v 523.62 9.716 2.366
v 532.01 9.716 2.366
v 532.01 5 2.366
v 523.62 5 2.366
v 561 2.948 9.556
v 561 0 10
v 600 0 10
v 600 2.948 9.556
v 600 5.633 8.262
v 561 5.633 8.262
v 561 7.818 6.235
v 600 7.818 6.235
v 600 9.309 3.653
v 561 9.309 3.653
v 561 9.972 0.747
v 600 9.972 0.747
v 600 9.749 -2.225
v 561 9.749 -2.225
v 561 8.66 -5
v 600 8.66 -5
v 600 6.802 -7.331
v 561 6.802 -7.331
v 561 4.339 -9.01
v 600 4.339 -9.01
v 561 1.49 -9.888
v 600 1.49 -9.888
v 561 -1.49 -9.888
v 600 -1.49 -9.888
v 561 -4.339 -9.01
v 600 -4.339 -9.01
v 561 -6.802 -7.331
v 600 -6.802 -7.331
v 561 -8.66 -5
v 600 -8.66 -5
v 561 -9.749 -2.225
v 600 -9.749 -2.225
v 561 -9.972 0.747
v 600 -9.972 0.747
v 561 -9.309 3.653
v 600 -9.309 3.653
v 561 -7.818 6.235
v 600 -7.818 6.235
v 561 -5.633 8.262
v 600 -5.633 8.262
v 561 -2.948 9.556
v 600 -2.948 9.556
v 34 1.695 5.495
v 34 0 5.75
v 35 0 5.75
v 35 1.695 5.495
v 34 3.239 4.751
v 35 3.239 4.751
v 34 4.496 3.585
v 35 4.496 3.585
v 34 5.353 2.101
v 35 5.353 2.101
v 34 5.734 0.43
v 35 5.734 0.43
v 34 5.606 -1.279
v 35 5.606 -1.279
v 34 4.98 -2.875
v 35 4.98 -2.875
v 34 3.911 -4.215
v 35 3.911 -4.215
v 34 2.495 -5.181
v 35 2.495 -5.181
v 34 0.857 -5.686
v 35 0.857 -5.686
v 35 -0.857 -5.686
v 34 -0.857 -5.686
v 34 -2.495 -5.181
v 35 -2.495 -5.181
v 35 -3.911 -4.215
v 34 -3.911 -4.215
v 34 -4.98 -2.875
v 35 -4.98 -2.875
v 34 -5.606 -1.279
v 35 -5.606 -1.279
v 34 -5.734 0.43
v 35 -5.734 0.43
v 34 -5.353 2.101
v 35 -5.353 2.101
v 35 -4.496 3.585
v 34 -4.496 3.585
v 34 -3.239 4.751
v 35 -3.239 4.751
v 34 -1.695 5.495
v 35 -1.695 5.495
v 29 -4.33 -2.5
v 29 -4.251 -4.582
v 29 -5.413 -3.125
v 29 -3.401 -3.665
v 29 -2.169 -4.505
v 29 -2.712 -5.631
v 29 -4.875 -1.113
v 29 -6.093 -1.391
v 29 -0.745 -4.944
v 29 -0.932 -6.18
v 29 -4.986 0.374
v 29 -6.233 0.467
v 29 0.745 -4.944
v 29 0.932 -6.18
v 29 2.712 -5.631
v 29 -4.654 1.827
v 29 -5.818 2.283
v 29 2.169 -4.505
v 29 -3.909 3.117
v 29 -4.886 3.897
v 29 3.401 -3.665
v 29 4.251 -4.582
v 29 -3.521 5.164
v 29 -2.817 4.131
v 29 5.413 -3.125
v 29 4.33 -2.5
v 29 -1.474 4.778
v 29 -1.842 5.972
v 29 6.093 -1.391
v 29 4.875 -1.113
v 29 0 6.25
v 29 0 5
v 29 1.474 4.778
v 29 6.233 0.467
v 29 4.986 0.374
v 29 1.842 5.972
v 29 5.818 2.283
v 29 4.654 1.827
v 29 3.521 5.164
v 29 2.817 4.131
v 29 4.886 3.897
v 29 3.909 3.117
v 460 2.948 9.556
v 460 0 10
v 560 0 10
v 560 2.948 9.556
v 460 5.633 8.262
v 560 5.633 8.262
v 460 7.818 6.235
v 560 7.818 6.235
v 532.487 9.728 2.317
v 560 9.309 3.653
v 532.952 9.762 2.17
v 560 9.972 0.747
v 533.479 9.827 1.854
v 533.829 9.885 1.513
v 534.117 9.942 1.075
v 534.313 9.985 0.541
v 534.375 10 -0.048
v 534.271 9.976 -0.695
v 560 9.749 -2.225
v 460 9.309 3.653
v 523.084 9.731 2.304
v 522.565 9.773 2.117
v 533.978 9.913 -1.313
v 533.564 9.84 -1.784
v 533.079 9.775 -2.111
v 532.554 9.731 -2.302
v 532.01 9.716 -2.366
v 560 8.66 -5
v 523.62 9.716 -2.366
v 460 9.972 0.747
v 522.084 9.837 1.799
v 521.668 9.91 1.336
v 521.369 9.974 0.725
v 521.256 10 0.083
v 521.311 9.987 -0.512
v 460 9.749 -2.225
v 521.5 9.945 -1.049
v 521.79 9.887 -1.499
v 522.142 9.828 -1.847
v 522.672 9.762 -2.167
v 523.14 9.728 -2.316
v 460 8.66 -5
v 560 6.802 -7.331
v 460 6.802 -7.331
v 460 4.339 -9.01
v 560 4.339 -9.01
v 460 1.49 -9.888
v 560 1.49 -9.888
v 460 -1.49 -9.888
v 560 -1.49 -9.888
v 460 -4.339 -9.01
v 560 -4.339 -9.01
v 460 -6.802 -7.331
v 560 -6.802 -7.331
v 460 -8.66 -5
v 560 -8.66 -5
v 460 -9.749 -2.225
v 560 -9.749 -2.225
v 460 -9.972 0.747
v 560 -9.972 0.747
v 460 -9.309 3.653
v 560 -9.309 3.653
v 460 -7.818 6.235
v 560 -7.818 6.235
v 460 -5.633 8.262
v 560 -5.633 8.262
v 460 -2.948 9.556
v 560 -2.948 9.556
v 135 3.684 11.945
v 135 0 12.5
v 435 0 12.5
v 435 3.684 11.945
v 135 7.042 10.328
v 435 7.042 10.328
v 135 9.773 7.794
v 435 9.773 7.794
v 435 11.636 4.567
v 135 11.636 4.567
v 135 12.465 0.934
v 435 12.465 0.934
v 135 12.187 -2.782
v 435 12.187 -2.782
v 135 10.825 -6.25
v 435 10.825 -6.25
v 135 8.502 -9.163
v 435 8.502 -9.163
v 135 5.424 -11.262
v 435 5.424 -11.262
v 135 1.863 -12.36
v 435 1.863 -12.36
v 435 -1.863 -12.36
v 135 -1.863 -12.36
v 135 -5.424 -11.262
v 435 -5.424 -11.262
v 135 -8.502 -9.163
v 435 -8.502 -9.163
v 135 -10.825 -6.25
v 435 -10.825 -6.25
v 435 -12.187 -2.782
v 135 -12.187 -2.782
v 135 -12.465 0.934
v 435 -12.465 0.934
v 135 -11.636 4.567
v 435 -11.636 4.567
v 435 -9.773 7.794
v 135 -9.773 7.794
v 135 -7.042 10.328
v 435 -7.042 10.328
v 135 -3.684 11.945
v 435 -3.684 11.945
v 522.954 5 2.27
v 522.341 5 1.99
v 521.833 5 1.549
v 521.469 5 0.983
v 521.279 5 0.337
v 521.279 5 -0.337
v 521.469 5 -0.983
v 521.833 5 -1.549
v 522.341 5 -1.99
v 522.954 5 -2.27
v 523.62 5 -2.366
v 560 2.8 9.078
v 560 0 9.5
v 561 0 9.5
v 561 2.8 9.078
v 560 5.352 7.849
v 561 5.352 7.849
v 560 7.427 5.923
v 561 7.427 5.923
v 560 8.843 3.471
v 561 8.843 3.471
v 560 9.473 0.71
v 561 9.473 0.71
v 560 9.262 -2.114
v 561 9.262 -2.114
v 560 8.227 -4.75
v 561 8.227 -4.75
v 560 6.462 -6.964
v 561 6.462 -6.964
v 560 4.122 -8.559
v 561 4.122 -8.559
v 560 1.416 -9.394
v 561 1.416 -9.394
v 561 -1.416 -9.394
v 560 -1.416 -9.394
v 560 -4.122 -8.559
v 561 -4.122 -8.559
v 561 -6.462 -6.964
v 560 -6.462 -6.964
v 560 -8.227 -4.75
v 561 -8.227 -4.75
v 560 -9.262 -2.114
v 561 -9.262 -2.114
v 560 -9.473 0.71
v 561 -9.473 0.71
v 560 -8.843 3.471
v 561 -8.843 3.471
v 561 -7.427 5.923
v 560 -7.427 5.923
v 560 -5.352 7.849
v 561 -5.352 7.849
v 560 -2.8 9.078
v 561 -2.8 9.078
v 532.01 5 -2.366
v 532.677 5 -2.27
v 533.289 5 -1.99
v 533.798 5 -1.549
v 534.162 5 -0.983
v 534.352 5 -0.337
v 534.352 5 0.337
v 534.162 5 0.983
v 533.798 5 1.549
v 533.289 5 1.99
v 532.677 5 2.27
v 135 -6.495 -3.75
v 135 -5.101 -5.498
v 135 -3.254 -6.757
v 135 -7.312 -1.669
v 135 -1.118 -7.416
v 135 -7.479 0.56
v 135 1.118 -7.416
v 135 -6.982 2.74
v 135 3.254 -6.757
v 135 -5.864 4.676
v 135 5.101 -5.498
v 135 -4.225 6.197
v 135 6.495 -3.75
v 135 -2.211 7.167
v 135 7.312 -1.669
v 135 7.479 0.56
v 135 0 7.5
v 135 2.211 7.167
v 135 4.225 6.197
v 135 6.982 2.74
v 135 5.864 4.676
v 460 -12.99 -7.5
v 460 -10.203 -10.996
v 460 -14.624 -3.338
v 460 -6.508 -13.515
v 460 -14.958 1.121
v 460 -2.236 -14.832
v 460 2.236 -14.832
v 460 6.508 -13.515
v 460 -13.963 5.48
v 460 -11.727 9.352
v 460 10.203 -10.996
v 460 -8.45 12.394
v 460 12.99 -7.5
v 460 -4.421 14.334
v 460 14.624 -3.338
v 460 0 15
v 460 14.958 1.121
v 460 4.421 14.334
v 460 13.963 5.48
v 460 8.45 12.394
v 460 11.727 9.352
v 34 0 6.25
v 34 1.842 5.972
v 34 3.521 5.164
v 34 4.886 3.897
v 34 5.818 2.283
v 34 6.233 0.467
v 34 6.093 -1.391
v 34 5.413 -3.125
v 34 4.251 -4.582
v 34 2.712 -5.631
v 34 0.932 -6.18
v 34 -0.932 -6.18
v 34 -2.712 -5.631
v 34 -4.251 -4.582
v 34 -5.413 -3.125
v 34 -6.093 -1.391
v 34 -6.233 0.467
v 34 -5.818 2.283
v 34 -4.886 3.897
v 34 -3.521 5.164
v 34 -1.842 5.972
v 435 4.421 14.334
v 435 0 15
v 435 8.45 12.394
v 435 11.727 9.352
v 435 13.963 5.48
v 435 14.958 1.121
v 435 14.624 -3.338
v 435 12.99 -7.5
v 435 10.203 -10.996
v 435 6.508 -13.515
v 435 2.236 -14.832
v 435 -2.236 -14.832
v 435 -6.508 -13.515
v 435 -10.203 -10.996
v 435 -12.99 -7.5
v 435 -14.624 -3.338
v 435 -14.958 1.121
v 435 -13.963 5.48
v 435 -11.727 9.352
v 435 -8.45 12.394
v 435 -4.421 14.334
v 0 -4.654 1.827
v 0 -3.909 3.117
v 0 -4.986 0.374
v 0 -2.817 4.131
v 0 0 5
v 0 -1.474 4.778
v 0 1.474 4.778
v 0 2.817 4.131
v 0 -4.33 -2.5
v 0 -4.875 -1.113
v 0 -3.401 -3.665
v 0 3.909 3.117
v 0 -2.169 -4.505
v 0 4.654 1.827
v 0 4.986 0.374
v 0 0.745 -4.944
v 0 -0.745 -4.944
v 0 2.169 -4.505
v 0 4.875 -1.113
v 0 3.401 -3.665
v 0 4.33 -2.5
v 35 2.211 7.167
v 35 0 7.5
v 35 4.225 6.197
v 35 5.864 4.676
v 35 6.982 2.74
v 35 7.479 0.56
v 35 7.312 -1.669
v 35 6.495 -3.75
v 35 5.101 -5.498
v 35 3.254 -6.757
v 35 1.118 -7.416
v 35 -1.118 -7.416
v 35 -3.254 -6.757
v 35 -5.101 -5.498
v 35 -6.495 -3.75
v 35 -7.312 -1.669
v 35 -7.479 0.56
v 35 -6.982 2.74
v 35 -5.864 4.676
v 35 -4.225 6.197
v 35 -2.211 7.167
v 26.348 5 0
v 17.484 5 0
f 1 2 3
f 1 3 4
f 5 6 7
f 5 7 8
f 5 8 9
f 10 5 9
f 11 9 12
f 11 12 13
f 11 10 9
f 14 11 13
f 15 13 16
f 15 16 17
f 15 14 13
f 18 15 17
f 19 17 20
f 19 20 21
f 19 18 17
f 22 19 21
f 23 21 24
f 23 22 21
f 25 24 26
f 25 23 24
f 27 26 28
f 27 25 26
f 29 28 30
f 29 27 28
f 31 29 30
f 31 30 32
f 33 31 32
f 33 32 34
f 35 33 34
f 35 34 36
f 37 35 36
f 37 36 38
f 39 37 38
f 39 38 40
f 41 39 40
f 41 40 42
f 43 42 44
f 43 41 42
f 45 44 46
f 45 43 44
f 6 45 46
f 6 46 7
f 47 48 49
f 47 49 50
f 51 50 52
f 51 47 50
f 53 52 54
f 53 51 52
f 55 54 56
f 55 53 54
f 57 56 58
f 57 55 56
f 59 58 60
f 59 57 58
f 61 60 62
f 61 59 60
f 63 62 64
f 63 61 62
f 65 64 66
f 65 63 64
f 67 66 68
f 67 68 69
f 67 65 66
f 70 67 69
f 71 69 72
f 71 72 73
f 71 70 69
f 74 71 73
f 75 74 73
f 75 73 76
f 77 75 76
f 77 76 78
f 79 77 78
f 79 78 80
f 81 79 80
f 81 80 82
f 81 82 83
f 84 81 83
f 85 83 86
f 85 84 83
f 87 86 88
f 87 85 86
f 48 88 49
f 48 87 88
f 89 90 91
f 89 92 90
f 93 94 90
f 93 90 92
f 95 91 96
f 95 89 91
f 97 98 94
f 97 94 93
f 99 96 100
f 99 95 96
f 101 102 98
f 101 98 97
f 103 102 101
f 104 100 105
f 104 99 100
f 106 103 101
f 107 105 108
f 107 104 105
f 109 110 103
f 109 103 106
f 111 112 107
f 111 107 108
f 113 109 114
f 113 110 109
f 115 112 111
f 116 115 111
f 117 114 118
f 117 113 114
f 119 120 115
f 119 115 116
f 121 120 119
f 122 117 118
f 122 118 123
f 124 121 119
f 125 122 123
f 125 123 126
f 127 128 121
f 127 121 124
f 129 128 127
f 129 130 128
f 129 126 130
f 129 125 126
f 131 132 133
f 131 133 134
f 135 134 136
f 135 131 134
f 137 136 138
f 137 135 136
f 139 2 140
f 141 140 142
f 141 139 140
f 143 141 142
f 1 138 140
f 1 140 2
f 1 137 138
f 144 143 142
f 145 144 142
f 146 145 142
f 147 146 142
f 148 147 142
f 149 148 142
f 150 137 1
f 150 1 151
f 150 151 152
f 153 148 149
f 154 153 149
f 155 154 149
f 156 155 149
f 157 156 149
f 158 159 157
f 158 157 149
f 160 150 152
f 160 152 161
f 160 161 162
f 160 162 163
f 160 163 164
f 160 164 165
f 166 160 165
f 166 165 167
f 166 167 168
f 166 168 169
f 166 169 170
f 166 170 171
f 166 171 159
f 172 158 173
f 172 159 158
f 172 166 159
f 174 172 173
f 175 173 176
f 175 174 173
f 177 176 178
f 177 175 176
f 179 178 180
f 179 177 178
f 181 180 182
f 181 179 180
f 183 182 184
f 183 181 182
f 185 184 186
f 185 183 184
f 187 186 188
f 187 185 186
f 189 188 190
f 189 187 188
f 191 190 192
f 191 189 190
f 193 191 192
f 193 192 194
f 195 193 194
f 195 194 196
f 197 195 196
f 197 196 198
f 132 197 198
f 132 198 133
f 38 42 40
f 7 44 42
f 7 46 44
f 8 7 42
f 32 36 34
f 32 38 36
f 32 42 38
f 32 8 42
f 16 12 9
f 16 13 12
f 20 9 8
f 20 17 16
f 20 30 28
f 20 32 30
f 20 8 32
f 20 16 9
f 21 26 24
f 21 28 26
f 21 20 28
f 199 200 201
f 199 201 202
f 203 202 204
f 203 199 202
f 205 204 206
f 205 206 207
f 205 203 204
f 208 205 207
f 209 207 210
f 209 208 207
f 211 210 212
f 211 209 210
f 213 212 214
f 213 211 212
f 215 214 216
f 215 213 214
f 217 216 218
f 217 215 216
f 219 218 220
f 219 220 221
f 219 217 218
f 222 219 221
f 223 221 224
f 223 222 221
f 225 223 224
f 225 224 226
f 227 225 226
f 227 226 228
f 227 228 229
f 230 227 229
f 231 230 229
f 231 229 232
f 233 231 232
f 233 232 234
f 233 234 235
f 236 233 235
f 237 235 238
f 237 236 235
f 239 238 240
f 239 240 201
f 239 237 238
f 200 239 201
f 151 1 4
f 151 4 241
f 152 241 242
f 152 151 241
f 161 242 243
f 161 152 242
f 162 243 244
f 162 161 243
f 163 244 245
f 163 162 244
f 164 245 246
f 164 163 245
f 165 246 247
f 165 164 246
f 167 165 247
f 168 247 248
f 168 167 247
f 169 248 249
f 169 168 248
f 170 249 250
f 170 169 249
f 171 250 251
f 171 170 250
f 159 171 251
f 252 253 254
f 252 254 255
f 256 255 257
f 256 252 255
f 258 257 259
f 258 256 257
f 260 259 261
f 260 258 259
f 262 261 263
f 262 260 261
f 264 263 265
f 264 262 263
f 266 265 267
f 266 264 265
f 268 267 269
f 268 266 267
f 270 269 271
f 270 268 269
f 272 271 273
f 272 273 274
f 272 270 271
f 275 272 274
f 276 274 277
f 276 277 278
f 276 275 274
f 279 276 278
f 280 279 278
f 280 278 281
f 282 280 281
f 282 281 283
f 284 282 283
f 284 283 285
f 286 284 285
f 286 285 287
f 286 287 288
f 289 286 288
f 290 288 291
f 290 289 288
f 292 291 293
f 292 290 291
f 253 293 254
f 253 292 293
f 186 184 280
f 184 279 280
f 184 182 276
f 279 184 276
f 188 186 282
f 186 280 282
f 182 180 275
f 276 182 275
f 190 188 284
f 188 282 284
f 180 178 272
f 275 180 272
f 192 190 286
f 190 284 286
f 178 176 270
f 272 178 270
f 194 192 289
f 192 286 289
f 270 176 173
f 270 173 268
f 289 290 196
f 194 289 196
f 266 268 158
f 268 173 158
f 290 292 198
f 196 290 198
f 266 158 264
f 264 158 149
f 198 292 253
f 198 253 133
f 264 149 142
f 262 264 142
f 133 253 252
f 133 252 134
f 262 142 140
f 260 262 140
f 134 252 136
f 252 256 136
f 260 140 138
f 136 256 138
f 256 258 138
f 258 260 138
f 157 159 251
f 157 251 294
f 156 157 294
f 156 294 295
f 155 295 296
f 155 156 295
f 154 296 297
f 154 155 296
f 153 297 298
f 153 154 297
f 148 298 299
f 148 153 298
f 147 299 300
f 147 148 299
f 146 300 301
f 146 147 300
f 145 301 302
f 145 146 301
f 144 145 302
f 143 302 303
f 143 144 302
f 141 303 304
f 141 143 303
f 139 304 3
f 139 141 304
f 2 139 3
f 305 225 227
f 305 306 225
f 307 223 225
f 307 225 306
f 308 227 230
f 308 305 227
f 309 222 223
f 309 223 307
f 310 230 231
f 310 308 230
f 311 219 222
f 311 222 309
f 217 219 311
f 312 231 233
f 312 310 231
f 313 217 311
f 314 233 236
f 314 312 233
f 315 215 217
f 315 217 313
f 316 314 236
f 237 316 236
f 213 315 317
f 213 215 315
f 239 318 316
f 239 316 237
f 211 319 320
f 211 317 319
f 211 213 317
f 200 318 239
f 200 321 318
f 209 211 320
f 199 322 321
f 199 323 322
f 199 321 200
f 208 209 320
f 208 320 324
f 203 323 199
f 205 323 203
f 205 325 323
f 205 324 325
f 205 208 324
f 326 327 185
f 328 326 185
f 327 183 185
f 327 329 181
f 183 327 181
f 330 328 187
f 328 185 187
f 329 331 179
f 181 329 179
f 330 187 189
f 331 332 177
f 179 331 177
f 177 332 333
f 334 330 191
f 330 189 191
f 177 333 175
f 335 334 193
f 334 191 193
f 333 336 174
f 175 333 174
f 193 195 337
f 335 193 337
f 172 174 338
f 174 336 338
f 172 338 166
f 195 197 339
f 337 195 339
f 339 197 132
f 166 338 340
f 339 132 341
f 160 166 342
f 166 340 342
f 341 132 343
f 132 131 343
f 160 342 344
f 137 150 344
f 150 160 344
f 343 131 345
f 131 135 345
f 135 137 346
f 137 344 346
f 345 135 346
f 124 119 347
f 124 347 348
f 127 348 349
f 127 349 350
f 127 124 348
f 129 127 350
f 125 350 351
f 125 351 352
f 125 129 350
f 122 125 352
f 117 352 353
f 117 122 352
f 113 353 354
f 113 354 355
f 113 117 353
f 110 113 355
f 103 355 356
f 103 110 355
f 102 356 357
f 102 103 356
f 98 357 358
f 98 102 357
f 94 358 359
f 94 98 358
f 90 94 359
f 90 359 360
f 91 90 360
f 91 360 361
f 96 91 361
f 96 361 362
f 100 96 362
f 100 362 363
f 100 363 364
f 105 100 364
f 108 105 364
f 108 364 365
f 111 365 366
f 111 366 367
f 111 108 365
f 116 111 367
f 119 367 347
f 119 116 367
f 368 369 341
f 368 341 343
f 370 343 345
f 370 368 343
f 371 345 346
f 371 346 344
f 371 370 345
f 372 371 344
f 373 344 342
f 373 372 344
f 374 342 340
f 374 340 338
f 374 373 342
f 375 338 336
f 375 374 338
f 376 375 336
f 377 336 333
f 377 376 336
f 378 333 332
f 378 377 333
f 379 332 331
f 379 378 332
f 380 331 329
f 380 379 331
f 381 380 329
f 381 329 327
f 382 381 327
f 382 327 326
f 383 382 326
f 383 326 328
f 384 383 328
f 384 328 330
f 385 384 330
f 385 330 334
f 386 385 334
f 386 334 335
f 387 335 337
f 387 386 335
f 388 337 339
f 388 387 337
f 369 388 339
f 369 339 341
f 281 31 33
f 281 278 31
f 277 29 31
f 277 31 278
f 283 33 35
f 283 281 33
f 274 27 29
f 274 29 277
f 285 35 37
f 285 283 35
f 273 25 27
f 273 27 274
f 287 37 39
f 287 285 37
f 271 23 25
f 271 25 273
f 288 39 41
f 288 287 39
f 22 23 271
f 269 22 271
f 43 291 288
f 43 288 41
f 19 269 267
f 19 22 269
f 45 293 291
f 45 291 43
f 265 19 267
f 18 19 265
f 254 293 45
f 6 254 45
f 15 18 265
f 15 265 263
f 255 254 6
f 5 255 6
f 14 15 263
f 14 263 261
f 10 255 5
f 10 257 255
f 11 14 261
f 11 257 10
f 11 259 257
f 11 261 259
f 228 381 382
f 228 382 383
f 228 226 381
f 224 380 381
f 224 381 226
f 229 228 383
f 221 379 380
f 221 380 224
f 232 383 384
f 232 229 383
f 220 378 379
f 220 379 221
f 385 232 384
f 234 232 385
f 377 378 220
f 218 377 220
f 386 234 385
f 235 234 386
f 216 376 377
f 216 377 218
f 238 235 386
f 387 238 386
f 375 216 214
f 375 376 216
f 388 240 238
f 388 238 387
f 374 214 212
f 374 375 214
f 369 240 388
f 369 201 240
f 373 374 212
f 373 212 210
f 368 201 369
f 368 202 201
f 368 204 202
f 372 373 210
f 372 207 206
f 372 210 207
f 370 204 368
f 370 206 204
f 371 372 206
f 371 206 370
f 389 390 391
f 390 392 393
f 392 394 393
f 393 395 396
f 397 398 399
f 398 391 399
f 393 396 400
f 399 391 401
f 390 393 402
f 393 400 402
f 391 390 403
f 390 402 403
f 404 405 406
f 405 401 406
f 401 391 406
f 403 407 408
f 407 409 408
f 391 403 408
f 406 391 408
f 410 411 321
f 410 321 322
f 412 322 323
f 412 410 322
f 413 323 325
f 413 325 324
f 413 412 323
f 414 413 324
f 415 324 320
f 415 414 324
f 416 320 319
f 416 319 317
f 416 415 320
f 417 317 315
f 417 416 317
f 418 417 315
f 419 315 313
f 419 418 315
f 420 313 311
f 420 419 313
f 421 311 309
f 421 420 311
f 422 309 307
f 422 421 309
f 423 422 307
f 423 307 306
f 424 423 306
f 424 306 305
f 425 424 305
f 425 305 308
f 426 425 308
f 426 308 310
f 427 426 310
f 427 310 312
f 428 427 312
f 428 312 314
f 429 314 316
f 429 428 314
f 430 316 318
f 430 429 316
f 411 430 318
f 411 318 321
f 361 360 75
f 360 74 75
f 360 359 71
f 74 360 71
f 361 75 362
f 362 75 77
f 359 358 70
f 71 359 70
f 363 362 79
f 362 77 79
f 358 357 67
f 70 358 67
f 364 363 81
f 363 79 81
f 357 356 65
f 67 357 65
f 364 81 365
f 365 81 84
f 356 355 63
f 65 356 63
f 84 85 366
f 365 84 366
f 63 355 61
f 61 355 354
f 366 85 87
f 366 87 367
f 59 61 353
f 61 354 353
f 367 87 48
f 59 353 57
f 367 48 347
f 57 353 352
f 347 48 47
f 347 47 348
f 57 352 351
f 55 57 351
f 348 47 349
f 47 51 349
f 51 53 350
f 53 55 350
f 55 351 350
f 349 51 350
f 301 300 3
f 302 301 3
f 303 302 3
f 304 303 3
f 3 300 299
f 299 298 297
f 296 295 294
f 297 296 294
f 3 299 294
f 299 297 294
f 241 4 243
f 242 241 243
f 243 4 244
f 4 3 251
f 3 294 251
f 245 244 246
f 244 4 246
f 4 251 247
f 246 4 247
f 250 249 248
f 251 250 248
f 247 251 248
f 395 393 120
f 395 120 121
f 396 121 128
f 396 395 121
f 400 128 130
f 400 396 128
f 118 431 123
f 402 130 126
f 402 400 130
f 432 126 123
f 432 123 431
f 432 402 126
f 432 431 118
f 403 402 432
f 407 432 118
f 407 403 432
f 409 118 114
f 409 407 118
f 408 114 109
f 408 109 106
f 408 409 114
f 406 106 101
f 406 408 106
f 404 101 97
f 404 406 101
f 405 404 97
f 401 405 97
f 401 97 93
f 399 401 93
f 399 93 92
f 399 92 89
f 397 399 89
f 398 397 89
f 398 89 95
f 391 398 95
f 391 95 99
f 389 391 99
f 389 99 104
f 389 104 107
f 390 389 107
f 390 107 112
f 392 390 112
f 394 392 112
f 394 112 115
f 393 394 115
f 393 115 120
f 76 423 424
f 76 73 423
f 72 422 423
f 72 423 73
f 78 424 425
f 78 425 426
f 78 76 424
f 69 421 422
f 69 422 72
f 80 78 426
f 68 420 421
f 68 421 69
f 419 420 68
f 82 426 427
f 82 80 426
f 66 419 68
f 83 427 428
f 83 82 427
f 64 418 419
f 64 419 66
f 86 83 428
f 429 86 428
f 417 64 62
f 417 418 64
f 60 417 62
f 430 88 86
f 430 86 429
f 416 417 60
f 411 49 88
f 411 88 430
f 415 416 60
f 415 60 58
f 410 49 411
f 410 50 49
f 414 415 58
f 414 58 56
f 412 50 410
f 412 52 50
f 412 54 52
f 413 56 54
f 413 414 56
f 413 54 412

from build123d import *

# Parameters (mm, degrees)
SKETCH1_R           = 500
BOSS_EXTRUDE1_DEPTH = 600
SKETCH2_OUTSIDE_W   = 1309.246
SKETCH2_OUTSIDE_H   = 1309.246
SKETCH2_OUTSIDE_R   = 5
CUT_EXTRUDE1_DEPTH  = 29
SKETCH3_OUTSIDE_W   = 1309.246
SKETCH3_OUTSIDE_H   = 1309.246
SKETCH3_OUTSIDE_R   = 6.25
CUT_EXTRUDE2_DEPTH  = 5
SKETCH4_OUTSIDE_W   = 1309.246
SKETCH4_OUTSIDE_H   = 1309.246
SKETCH4_OUTSIDE_R   = 5.75
CUT_EXTRUDE3_DEPTH  = 1
SKETCH5_OUTSIDE_W   = 1309.246
SKETCH5_OUTSIDE_H   = 1309.246
SKETCH5_OUTSIDE_R   = 7.5
CUT_EXTRUDE4_DEPTH  = 100
SKETCH6_OUTSIDE_W   = 1309.246
SKETCH6_OUTSIDE_H   = 1309.246
SKETCH6_OUTSIDE_R   = 12.5
CUT_EXTRUDE5_DEPTH  = 300
SKETCH7_OUTSIDE_W   = 1309.246
SKETCH7_OUTSIDE_H   = 1309.246
SKETCH7_OUTSIDE_R   = 15
CUT_EXTRUDE6_DEPTH  = 25
SKETCH8_OUTSIDE_W   = 1309.246
SKETCH8_OUTSIDE_H   = 1309.246
SKETCH8_OUTSIDE_R   = 10
CUT_EXTRUDE7_DEPTH  = 100
SKETCH9_OUTSIDE_W   = 1309.246
SKETCH9_OUTSIDE_H   = 1309.246
SKETCH9_OUTSIDE_R   = 9.5
CUT_EXTRUDE8_DEPTH  = 1
SKETCH10_OUTSIDE_W  = 1309.246
SKETCH10_OUTSIDE_H  = 1309.246
SKETCH10_OUTSIDE_R  = 10
CUT_EXTRUDE10_DEPTH = 39
CUT_EXTRUDE11_DEPTH = 25


with BuildPart() as part:
    # Sketch1 → Boss-Extrude1 (new body)
    with BuildSketch(Plane(origin=(0, 0, 0), x_dir=(0, 0, -1), z_dir=(1, 0, 0))):
        Circle(SKETCH1_R)
    extrude(amount=BOSS_EXTRUDE1_DEPTH)

    # Sketch2 outside → Cut-Extrude1 (cut)
    with BuildSketch(Plane.ZY):
        Rectangle(SKETCH2_OUTSIDE_W, SKETCH2_OUTSIDE_H)
        Circle(SKETCH2_OUTSIDE_R, mode=Mode.SUBTRACT)
    extrude(amount=-CUT_EXTRUDE1_DEPTH, mode=Mode.SUBTRACT)

    # Sketch3 outside → Cut-Extrude2 (cut)
    with BuildSketch(Plane.ZY.offset(-29)):
        Rectangle(SKETCH3_OUTSIDE_W, SKETCH3_OUTSIDE_H)
        Circle(SKETCH3_OUTSIDE_R, mode=Mode.SUBTRACT)
    extrude(amount=-CUT_EXTRUDE2_DEPTH, mode=Mode.SUBTRACT)

    # Sketch4 outside → Cut-Extrude3 (cut)
    with BuildSketch(Plane.ZY.offset(-34)):
        Rectangle(SKETCH4_OUTSIDE_W, SKETCH4_OUTSIDE_H)
        Circle(SKETCH4_OUTSIDE_R, mode=Mode.SUBTRACT)
    extrude(amount=-CUT_EXTRUDE3_DEPTH, mode=Mode.SUBTRACT)

    # Sketch5 outside → Cut-Extrude4 (cut)
    with BuildSketch(Plane.ZY.offset(-35)):
        Rectangle(SKETCH5_OUTSIDE_W, SKETCH5_OUTSIDE_H)
        Circle(SKETCH5_OUTSIDE_R, mode=Mode.SUBTRACT)
    extrude(amount=-CUT_EXTRUDE4_DEPTH, mode=Mode.SUBTRACT)

    # Sketch6 outside → Cut-Extrude5 (cut)
    with BuildSketch(Plane.ZY.offset(-135)):
        Rectangle(SKETCH6_OUTSIDE_W, SKETCH6_OUTSIDE_H)
        Circle(SKETCH6_OUTSIDE_R, mode=Mode.SUBTRACT)
    extrude(amount=-CUT_EXTRUDE5_DEPTH, mode=Mode.SUBTRACT)

    # Sketch7 outside → Cut-Extrude6 (cut)
    with BuildSketch(Plane.ZY.offset(-435)):
        Rectangle(SKETCH7_OUTSIDE_W, SKETCH7_OUTSIDE_H)
        Circle(SKETCH7_OUTSIDE_R, mode=Mode.SUBTRACT)
    extrude(amount=-CUT_EXTRUDE6_DEPTH, mode=Mode.SUBTRACT)

    # Sketch8 outside → Cut-Extrude7 (cut)
    with BuildSketch(Plane.ZY.offset(-460)):
        Rectangle(SKETCH8_OUTSIDE_W, SKETCH8_OUTSIDE_H)
        Circle(SKETCH8_OUTSIDE_R, mode=Mode.SUBTRACT)
    extrude(amount=-CUT_EXTRUDE7_DEPTH, mode=Mode.SUBTRACT)

    # Sketch9 outside → Cut-Extrude8 (cut)
    with BuildSketch(Plane.ZY.offset(-560)):
        Rectangle(SKETCH9_OUTSIDE_W, SKETCH9_OUTSIDE_H)
        Circle(SKETCH9_OUTSIDE_R, mode=Mode.SUBTRACT)
    extrude(amount=-CUT_EXTRUDE8_DEPTH, mode=Mode.SUBTRACT)

    # Sketch10 outside → Cut-Extrude10 (cut)
    with BuildSketch(Plane.ZY.offset(-561)):
        Rectangle(SKETCH10_OUTSIDE_W, SKETCH10_OUTSIDE_H)
        Circle(SKETCH10_OUTSIDE_R, mode=Mode.SUBTRACT)
    extrude(amount=-CUT_EXTRUDE10_DEPTH, mode=Mode.SUBTRACT)

    # Sketch14<3> → Cut-Extrude11 (cut)
    with BuildSketch(Plane(origin=(0, 30, 0), x_dir=(1, 0, 0), z_dir=(0, 1, 0))):
        with BuildLine():
            Line((18.890286749, 1.405946281), (24.942306626, 1.405946281))
            ThreePointArc((24.942306626, 1.405946281), (26.348252906, 0), (24.942306626, -1.405946281))
            Line((24.942306626, -1.405946281), (18.890286749, -1.405946281))
            ThreePointArc((18.890286749, -1.405946281), (17.484340469, 0), (18.890286749, 1.405946281))
        make_face()
        with BuildLine():
            Line((523.62027087, 2.365533558), (532.010381059, 2.365533558))
            ThreePointArc((532.010381059, 2.365533558), (534.375914617, 0), (532.010381059, -2.365533558))
            Line((532.010381059, -2.365533558), (523.62027087, -2.365533558))
            ThreePointArc((523.62027087, -2.365533558), (521.254737312, 0), (523.62027087, 2.365533558))
        make_face()
    extrude(amount=-CUT_EXTRUDE11_DEPTH, mode=Mode.SUBTRACT)


solid = part.part
